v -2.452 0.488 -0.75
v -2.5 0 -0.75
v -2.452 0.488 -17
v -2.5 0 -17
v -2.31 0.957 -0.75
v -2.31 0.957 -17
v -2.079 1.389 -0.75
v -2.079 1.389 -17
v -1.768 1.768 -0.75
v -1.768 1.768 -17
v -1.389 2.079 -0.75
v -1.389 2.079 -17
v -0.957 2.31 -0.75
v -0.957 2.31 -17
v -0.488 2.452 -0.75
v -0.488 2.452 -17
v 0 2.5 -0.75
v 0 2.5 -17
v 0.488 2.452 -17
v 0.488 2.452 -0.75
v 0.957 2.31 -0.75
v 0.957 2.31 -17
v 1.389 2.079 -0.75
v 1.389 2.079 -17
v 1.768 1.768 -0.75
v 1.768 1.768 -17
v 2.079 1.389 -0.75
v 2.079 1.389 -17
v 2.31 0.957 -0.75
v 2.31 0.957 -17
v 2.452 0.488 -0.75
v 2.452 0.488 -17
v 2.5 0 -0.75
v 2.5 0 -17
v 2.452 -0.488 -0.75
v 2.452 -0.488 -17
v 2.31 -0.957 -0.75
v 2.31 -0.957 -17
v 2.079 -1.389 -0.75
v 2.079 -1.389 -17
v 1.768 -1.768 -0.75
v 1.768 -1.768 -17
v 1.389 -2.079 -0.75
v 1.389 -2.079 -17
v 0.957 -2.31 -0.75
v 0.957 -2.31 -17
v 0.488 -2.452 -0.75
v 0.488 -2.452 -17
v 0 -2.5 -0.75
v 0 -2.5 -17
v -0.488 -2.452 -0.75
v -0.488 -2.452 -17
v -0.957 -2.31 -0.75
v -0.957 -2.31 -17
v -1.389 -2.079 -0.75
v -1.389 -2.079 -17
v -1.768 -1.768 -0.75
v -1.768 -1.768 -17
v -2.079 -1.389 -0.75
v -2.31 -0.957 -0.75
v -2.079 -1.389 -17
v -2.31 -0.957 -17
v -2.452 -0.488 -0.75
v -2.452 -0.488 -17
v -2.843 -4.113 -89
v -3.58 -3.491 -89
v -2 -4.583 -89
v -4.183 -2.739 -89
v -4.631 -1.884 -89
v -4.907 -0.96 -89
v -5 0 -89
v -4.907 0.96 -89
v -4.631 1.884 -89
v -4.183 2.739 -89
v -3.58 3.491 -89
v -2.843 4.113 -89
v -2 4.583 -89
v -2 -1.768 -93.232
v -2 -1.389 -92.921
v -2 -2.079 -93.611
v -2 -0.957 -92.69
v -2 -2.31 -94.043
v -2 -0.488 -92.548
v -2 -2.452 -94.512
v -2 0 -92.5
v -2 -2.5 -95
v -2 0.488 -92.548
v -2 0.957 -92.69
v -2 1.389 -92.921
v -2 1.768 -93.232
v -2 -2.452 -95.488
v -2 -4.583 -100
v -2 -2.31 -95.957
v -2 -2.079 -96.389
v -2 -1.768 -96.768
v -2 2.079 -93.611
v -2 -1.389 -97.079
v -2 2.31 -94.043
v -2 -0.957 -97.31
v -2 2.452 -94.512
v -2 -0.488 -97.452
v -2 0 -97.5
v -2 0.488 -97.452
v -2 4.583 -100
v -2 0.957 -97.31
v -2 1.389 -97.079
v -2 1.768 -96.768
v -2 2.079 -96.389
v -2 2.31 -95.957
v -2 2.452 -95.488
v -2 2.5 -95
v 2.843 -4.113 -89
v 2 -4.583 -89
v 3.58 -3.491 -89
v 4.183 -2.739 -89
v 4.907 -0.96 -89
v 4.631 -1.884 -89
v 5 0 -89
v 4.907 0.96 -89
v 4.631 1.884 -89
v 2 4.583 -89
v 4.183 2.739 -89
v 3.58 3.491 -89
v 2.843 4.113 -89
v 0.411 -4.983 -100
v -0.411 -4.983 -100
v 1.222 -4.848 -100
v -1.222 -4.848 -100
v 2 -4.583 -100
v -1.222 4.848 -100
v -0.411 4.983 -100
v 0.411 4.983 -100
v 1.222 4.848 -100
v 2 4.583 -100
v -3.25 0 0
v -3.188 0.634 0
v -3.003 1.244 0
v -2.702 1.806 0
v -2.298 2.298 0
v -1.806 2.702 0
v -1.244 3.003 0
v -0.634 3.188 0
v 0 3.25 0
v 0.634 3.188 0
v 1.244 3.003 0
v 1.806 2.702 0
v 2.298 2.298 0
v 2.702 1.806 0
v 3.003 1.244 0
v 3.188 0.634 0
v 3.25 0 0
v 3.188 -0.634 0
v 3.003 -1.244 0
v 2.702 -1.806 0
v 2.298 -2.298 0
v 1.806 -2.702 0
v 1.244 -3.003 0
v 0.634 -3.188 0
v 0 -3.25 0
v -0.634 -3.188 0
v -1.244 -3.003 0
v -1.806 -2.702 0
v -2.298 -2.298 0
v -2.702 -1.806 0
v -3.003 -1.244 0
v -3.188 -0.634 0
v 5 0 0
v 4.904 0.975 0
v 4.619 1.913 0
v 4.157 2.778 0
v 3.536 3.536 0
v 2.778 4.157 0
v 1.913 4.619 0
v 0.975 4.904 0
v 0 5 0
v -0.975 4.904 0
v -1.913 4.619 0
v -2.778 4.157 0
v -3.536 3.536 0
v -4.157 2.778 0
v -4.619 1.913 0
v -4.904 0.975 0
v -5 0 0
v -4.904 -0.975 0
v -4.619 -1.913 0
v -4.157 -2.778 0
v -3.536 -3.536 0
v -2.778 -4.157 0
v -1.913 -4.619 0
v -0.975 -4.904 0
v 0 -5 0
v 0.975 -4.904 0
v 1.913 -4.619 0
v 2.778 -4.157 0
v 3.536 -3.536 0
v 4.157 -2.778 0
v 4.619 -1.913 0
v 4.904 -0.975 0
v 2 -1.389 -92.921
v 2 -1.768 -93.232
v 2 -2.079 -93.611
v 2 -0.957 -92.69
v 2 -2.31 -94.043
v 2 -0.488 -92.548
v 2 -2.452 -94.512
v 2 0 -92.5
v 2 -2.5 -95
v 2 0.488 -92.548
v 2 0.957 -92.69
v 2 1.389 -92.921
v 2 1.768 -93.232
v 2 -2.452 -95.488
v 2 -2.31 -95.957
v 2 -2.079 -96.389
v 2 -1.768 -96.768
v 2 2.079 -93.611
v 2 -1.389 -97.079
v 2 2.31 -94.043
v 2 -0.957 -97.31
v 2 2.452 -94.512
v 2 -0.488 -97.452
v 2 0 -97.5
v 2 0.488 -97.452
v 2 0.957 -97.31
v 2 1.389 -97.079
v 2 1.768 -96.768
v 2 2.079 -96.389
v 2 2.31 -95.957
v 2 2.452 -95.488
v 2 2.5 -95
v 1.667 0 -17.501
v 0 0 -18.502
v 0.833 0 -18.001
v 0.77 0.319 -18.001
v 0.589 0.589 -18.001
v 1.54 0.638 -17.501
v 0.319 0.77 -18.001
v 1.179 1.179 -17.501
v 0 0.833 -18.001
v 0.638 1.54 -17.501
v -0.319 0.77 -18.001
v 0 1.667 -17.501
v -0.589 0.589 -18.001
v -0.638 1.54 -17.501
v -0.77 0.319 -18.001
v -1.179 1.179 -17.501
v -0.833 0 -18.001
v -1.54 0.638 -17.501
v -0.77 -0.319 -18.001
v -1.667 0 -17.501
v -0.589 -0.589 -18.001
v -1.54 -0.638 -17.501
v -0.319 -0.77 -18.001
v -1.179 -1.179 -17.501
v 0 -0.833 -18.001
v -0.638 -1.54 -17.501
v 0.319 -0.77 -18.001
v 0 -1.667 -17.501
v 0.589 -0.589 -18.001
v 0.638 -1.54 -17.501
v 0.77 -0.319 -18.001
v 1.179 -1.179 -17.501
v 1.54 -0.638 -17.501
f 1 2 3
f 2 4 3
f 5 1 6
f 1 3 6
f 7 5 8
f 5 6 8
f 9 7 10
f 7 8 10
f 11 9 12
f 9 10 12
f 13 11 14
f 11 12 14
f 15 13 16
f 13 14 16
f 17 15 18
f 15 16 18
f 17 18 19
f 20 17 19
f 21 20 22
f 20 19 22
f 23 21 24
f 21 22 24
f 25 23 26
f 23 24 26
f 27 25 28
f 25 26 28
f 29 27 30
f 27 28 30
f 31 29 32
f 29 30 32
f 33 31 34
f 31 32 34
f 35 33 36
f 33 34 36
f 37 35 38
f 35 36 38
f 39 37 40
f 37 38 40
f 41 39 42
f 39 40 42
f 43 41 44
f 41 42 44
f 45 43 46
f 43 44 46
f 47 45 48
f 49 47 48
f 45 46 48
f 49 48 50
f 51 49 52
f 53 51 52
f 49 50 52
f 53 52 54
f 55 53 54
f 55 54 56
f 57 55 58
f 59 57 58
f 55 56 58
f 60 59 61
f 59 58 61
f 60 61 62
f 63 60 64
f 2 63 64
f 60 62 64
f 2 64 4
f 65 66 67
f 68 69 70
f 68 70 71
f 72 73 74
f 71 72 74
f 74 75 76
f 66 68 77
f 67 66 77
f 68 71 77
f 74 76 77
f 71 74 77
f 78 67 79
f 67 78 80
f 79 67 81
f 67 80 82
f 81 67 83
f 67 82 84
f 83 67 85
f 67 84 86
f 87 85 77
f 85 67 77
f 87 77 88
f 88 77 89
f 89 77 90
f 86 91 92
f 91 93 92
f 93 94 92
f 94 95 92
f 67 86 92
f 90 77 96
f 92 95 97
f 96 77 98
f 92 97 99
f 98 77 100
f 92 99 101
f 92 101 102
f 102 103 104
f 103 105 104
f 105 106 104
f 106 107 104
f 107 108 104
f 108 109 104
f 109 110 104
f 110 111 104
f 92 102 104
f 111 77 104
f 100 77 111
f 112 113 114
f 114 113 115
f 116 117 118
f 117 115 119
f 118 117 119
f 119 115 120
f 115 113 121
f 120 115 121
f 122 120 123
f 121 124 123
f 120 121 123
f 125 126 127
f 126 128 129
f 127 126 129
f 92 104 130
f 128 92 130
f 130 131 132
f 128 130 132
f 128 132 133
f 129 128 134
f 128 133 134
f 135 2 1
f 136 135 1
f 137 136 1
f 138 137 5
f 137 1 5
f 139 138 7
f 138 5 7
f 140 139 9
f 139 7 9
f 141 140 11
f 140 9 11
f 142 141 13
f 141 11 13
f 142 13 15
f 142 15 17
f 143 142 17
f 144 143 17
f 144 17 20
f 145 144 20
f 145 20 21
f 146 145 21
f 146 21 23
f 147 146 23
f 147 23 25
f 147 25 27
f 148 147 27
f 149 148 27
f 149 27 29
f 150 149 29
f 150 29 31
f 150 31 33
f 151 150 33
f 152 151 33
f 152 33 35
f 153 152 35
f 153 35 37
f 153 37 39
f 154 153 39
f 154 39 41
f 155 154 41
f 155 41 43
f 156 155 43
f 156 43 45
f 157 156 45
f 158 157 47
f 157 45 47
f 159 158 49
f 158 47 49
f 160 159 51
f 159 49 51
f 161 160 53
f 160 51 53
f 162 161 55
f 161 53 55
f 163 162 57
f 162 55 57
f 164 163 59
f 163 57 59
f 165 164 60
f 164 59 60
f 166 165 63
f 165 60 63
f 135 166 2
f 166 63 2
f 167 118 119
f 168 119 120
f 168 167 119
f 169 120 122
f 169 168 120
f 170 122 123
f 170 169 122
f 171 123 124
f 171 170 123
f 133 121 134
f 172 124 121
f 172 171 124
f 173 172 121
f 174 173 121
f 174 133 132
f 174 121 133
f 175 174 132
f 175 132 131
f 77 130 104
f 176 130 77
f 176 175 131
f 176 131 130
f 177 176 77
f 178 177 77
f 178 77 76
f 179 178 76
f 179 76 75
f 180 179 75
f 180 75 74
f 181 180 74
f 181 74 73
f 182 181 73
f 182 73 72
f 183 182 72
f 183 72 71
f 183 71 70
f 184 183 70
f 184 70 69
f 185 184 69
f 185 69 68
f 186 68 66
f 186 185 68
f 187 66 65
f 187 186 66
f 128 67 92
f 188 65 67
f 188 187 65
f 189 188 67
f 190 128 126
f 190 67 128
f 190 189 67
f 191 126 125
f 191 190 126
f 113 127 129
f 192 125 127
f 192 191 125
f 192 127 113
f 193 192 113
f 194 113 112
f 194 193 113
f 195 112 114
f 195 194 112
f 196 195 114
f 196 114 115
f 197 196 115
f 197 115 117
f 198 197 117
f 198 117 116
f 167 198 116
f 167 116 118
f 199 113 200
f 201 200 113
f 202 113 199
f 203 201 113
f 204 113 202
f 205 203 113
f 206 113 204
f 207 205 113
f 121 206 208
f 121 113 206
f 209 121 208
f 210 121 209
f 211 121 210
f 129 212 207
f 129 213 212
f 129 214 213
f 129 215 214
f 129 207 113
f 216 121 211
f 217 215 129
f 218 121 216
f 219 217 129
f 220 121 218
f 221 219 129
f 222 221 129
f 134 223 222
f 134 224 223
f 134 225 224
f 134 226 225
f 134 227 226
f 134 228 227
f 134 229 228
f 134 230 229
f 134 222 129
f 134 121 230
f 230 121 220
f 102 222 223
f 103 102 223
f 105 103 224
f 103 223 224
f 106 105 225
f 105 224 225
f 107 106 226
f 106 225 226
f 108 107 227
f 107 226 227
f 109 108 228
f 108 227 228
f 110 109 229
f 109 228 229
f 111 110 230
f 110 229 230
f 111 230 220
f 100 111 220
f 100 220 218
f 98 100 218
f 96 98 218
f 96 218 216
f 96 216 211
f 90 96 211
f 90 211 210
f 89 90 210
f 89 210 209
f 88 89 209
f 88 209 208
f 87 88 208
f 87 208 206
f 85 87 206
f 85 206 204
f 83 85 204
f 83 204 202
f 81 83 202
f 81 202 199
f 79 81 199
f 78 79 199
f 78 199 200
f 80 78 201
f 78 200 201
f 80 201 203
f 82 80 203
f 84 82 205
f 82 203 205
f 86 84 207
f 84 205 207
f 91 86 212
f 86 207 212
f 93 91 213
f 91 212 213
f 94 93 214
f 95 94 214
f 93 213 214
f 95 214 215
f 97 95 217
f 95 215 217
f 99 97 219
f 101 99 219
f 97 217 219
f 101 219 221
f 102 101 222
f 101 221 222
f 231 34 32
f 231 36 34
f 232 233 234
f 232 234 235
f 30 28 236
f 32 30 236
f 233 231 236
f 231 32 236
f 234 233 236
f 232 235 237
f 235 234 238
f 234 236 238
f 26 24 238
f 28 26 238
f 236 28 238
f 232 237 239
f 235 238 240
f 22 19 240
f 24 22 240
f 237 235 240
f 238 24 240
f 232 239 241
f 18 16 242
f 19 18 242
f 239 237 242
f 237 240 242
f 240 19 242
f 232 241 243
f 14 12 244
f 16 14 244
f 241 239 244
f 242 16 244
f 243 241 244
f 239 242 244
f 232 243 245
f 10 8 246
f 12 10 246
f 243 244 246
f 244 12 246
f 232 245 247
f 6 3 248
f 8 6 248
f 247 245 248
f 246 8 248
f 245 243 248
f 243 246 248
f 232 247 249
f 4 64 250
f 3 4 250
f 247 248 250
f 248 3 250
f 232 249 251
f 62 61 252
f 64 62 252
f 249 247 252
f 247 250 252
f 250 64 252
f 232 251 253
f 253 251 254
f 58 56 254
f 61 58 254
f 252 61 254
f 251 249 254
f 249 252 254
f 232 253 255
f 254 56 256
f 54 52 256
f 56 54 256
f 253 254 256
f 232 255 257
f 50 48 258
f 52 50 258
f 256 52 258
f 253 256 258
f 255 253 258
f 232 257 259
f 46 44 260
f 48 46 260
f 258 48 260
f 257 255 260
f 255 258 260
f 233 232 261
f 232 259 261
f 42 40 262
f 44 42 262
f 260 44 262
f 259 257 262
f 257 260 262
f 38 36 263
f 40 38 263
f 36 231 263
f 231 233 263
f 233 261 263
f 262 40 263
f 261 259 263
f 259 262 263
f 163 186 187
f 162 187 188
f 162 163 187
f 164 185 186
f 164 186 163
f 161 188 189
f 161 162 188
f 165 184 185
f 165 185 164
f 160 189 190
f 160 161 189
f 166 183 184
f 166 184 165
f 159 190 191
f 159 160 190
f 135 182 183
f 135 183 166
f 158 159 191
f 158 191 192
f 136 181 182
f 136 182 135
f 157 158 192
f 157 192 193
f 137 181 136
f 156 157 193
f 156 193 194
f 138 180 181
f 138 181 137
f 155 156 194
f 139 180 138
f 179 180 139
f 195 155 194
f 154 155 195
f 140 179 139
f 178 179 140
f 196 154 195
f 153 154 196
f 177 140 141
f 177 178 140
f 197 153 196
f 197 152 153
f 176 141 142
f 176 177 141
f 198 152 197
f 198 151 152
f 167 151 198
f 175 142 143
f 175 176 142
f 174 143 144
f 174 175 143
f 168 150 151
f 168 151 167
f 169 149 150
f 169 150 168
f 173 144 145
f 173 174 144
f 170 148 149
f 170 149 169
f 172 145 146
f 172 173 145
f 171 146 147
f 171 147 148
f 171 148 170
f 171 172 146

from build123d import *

# Parameters (mm, degrees)
SKETCH1_R                       = 5
BOSS_EXTRUDE1_DEPTH             = 100
CUT_EXTRUDE5_REACH              = 7
SKETCH2_W                       = 3
SKETCH2_H                       = 11
CUT_EXTRUDE5_DIRECTION_2_REACH  = 7
CUT_EXTRUDE6_REACH              = 9
SKETCH3_R                       = 2.5
M6X1_0_TAPPED_HOLE1_D           = 5
M6X1_0_TAPPED_HOLE1_DEPTH       = 17
M6X1_0_TAPPED_HOLE1_CSINK_D     = 6.5
M6X1_0_TAPPED_HOLE1_CSINK_ANGLE = 90
M6X1_0_TAPPED_HOLE1_TIP         = 1.502151548


with BuildPart() as part:
    # Sketch1 → Boss-Extrude1 (new body)
    with BuildSketch(Plane.XY):
        Circle(SKETCH1_R)
    extrude(amount=-BOSS_EXTRUDE1_DEPTH)

    # Sketch2 → Cut-Extrude5 (cut, up to next)
    with BuildSketch(Plane(origin=(0, 0, 0), x_dir=(1, 0, 0), z_dir=(0, 1, 0)), mode=Mode.PRIVATE) as cut_extrude5_sk1:
        with Locations((-3.5, 94.5)):
            Rectangle(SKETCH2_W, SKETCH2_H)
    cut_extrude5_tool1 = extrude(cut_extrude5_sk1.sketch, amount=-CUT_EXTRUDE5_REACH, mode=Mode.PRIVATE) & part.part
    add(cut_extrude5_tool1.solids().sort_by_distance((-3.5, 0, -94.5))[0], mode=Mode.SUBTRACT)
    # Sketch2 → Cut-Extrude5 (cut, up to next)
    with BuildSketch(Plane(origin=(0, 0, 0), x_dir=(1, 0, 0), z_dir=(0, 1, 0)), mode=Mode.PRIVATE) as cut_extrude5_sk2:
        with Locations((3.5, 94.5)):
            Rectangle(SKETCH2_W, SKETCH2_H)
    cut_extrude5_tool2 = extrude(cut_extrude5_sk2.sketch, amount=-CUT_EXTRUDE5_REACH, mode=Mode.PRIVATE) & part.part
    add(cut_extrude5_tool2.solids().sort_by_distance((3.5, 0, -94.5))[0], mode=Mode.SUBTRACT)

    # Sketch2 → Cut-Extrude5 direction 2 (cut, up to next)
    with BuildSketch(Plane(origin=(0, 0, 0), x_dir=(1, 0, 0), z_dir=(0, 1, 0)), mode=Mode.PRIVATE) as cut_extrude5_direction_2_sk1:
        with Locations((-3.5, 94.5)):
            Rectangle(SKETCH2_W, SKETCH2_H)
    cut_extrude5_direction_2_tool1 = extrude(cut_extrude5_direction_2_sk1.sketch, amount=CUT_EXTRUDE5_DIRECTION_2_REACH, mode=Mode.PRIVATE) & part.part
    add(cut_extrude5_direction_2_tool1.solids().sort_by_distance((-3.5, 0, -94.5))[0], mode=Mode.SUBTRACT)
    # Sketch2 → Cut-Extrude5 direction 2 (cut, up to next)
    with BuildSketch(Plane(origin=(0, 0, 0), x_dir=(1, 0, 0), z_dir=(0, 1, 0)), mode=Mode.PRIVATE) as cut_extrude5_direction_2_sk2:
        with Locations((3.5, 94.5)):
            Rectangle(SKETCH2_W, SKETCH2_H)
    cut_extrude5_direction_2_tool2 = extrude(cut_extrude5_direction_2_sk2.sketch, amount=CUT_EXTRUDE5_DIRECTION_2_REACH, mode=Mode.PRIVATE) & part.part
    add(cut_extrude5_direction_2_tool2.solids().sort_by_distance((3.5, 0, -94.5))[0], mode=Mode.SUBTRACT)

    # Sketch3 → Cut-Extrude6 (cut, up to next)
    with BuildSketch(Plane(origin=(2, 0, 0), x_dir=(0, 0, -1), z_dir=(1, 0, 0)), mode=Mode.PRIVATE) as cut_extrude6_sk1:
        with Locations((95, 0)):
            Circle(SKETCH3_R)
    cut_extrude6_tool1 = extrude(cut_extrude6_sk1.sketch, amount=-CUT_EXTRUDE6_REACH, mode=Mode.PRIVATE) & part.part
    add(cut_extrude6_tool1.solids().sort_by_distance((2, 0, -95))[0], mode=Mode.SUBTRACT)

    # M6x1.0 Tapped Hole1
    with Locations(Plane.XY):
        with Locations((0, 0)):
            CounterSinkHole(M6X1_0_TAPPED_HOLE1_D / 2, M6X1_0_TAPPED_HOLE1_CSINK_D / 2, depth=M6X1_0_TAPPED_HOLE1_DEPTH, counter_sink_angle=M6X1_0_TAPPED_HOLE1_CSINK_ANGLE)
            with Locations((0, 0, -(M6X1_0_TAPPED_HOLE1_DEPTH + M6X1_0_TAPPED_HOLE1_TIP / 2))):  # 118° drill point
                Cone(0, M6X1_0_TAPPED_HOLE1_D / 2, M6X1_0_TAPPED_HOLE1_TIP, mode=Mode.SUBTRACT)


solid = part.part
